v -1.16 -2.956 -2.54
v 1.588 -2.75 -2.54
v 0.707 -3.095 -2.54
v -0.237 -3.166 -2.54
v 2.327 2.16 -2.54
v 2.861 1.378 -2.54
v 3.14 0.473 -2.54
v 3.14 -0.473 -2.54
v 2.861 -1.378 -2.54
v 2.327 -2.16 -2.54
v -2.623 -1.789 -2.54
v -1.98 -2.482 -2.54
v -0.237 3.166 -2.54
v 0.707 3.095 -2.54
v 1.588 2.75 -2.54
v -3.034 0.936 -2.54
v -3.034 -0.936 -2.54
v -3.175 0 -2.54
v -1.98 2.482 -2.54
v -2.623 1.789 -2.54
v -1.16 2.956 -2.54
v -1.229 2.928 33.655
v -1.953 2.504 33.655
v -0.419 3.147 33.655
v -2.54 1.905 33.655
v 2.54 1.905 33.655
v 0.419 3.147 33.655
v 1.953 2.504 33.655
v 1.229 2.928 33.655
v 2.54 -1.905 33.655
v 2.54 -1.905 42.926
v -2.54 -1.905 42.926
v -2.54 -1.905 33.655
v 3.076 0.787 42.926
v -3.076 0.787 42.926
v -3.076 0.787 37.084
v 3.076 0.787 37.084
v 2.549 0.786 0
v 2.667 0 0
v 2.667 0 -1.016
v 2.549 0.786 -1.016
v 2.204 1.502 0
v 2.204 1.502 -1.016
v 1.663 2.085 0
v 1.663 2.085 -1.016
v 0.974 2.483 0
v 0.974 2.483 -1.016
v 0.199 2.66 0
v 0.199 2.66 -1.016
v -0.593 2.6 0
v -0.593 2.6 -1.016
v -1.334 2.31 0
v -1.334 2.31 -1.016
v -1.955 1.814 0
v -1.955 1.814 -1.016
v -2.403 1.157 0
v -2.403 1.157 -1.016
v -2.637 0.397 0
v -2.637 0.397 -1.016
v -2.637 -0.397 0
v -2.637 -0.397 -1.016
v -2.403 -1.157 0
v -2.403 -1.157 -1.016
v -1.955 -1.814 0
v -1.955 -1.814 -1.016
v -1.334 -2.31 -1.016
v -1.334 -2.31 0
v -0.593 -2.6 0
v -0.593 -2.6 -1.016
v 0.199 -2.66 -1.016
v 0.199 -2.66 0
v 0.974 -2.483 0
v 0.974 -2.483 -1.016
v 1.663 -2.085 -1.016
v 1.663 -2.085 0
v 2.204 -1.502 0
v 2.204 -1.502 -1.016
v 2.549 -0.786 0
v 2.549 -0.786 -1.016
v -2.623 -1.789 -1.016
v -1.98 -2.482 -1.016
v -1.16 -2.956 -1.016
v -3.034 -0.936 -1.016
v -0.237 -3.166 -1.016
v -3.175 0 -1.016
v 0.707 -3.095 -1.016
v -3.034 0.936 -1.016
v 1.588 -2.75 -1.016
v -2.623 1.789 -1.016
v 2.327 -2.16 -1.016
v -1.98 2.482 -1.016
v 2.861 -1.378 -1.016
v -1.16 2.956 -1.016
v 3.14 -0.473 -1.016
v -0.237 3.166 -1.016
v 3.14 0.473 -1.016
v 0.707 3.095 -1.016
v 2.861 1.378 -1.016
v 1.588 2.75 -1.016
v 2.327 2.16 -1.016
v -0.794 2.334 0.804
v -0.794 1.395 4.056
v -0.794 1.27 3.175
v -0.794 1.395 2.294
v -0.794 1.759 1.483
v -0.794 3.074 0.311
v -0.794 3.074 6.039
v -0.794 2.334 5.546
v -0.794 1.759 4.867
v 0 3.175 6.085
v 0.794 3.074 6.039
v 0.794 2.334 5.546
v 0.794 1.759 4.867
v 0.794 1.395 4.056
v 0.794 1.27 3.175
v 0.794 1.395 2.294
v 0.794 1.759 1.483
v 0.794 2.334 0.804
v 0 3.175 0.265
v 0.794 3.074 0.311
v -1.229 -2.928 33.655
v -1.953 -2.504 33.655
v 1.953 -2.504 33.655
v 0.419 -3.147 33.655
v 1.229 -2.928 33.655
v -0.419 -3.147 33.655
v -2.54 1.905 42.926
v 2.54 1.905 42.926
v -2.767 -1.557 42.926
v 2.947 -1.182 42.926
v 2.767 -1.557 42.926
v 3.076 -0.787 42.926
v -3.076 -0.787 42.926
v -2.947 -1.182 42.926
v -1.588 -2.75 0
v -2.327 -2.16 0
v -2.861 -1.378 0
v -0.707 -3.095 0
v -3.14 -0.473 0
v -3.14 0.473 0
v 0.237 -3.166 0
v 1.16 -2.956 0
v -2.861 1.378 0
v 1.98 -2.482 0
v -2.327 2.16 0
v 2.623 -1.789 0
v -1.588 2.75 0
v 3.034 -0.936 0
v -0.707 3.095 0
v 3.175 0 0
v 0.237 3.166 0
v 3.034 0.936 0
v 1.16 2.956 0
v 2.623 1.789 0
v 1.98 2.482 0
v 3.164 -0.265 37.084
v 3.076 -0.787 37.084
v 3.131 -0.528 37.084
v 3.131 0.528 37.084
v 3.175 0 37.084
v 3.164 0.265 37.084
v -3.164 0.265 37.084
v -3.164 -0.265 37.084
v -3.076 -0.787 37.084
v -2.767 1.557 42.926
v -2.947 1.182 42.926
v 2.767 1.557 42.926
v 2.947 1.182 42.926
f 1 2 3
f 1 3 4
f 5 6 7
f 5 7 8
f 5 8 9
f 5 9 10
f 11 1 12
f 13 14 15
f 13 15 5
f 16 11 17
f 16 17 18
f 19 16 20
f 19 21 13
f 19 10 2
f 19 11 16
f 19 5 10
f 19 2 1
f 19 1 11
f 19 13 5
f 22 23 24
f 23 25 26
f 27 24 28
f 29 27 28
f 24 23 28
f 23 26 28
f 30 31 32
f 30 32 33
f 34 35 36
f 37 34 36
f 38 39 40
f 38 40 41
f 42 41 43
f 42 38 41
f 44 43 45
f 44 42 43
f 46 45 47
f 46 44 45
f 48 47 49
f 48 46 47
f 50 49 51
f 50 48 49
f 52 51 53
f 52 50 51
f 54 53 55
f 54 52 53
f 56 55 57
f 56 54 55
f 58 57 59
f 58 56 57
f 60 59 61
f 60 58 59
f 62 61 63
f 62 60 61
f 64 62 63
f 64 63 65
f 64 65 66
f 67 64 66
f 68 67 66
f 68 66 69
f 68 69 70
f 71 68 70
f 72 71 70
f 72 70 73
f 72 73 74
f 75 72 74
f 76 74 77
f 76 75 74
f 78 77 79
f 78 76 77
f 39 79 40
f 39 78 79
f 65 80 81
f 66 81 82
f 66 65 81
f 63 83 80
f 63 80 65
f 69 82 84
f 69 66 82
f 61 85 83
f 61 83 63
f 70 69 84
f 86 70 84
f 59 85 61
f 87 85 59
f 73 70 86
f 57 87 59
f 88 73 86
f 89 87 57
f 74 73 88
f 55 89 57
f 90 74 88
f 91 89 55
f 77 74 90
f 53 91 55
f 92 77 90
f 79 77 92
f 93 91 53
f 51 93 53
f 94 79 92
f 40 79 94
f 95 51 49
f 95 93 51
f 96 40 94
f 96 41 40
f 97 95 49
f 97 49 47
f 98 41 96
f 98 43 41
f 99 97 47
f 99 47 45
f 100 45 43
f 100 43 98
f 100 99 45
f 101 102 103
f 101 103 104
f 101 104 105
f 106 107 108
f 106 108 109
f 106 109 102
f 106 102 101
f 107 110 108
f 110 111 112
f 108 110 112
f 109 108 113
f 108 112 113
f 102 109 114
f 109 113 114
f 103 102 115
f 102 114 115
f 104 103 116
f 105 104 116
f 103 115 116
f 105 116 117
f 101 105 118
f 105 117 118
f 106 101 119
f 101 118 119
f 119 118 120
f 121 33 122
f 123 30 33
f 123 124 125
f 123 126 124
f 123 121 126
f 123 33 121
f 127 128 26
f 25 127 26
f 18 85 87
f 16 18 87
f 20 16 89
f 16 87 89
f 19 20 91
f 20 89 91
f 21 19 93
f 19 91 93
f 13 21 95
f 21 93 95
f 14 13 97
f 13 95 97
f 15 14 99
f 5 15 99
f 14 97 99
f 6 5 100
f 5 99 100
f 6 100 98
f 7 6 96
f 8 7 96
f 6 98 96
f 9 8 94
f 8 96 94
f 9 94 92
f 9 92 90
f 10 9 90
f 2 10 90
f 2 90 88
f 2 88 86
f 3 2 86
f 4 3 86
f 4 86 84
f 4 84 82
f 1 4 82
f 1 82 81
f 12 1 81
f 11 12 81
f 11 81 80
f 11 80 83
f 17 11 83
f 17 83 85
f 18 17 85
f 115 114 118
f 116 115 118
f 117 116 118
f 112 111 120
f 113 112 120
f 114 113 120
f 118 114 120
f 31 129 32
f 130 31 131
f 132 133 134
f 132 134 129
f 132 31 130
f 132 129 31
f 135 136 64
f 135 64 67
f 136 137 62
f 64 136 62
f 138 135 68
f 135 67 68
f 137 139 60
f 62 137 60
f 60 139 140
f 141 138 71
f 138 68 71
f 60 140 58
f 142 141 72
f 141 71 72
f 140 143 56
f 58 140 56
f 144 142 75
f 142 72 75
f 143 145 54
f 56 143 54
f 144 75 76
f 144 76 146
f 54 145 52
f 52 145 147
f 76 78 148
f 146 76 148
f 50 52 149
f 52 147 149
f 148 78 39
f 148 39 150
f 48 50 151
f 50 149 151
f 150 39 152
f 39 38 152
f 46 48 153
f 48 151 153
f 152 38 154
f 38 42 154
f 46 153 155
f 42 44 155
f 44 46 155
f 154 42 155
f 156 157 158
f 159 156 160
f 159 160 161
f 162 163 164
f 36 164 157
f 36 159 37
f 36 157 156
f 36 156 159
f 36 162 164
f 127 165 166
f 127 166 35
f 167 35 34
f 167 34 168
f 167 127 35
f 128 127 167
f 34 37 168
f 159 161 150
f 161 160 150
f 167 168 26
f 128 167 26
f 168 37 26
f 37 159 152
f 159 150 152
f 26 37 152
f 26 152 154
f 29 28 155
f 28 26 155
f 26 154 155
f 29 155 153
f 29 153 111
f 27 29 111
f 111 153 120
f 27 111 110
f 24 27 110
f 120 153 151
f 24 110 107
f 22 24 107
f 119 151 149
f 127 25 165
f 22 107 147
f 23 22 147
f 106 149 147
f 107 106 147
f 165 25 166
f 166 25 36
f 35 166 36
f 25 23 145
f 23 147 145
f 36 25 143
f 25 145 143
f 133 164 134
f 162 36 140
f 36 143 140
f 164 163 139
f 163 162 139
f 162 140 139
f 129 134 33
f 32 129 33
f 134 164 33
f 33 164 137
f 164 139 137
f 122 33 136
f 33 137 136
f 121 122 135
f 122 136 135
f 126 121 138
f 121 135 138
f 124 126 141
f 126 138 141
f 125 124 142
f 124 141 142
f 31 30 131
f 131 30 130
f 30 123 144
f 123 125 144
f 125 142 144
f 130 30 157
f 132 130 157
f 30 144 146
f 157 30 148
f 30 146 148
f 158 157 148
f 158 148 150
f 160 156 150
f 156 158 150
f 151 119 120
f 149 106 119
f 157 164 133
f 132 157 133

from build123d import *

# Parameters (mm, degrees)
SKETCH1_R           = 3.175
EXTRUDE1_DEPTH      = 42.926
SKETCH4_R           = 3.175
EXTRUDE2_DEPTH      = 0.79375
EXTRUDE2_DEPTH_BACK = 0.79375
SKETCH5_R           = 3.175
EXTRUDE3_DEPTH      = 2.54
SKETCH6_OUTSIDE_W   = 17.618
SKETCH6_OUTSIDE_H   = 17.618
SKETCH6_OUTSIDE_R   = 2.667
EXTRUDE4_DEPTH      = 1.016
EXTRUDE5_DEPTH      = 4.1750001
EXTRUDE5_DEPTH_BACK = 4.1750001
EXTRUDE6_DEPTH      = 4.1750001


with BuildPart() as part:
    # Sketch1 → Extrude1 (new body)
    with BuildSketch(Plane.XY):
        Circle(SKETCH1_R)
    extrude(amount=EXTRUDE1_DEPTH)

    # Sketch4 → Extrude2 (cut, two sides)
    with BuildSketch(Plane(origin=(0, 0, 0), x_dir=(0, 0, -1), z_dir=(1, 0, 0))) as extrude2_sk:
        with Locations((-3.175, 4.445)):
            Circle(SKETCH4_R)
    extrude(amount=EXTRUDE2_DEPTH, mode=Mode.SUBTRACT)
    extrude(extrude2_sk.sketch, amount=-EXTRUDE2_DEPTH_BACK, mode=Mode.SUBTRACT)

    # Sketch5 → Extrude3 (add)
    with BuildSketch(Plane(origin=(0, 0, 0), x_dir=(-1, 0, 0), z_dir=(0, 0, -1))):
        Circle(SKETCH5_R)
    extrude(amount=EXTRUDE3_DEPTH)

    # Sketch6 outside → Extrude4 (cut)
    with BuildSketch(Plane.XY):
        Rectangle(SKETCH6_OUTSIDE_W, SKETCH6_OUTSIDE_H)
        Circle(SKETCH6_OUTSIDE_R, mode=Mode.SUBTRACT)
    extrude(amount=-EXTRUDE4_DEPTH, mode=Mode.SUBTRACT)

    # Sketch7 → Extrude5 (cut, two sides)
    with BuildSketch(Plane(origin=(0, 0, 0), x_dir=(0, 0, -1), z_dir=(1, 0, 0))) as extrude5_sk:
        Polygon((-42.926, 0), (-42.926, 0.7874), (-37.084, 0.7874), (-37.084, 0), (-37.084, -0.7874), (-42.926, -0.7874), align=None)
    extrude(amount=EXTRUDE5_DEPTH, mode=Mode.SUBTRACT)
    extrude(extrude5_sk.sketch, amount=-EXTRUDE5_DEPTH_BACK, mode=Mode.SUBTRACT)

    # Sketch8 → Extrude6 (cut, symmetric)
    with BuildSketch(Plane(origin=(0, 0, 0), x_dir=(0, 0, -1), z_dir=(1, 0, 0))):
        Polygon((-42.926, 1.905), (-40.005, 1.905), (-33.655, 1.905), (-33.655, 3.175), (-42.926, 3.175), align=None)
    extrude6 = extrude(amount=EXTRUDE6_DEPTH, both=True, mode=Mode.SUBTRACT)

    # Mirror1: Extrude6 across plane
    add(extrude6.mirror(Plane.ZX), mode=Mode.SUBTRACT)


solid = part.part
